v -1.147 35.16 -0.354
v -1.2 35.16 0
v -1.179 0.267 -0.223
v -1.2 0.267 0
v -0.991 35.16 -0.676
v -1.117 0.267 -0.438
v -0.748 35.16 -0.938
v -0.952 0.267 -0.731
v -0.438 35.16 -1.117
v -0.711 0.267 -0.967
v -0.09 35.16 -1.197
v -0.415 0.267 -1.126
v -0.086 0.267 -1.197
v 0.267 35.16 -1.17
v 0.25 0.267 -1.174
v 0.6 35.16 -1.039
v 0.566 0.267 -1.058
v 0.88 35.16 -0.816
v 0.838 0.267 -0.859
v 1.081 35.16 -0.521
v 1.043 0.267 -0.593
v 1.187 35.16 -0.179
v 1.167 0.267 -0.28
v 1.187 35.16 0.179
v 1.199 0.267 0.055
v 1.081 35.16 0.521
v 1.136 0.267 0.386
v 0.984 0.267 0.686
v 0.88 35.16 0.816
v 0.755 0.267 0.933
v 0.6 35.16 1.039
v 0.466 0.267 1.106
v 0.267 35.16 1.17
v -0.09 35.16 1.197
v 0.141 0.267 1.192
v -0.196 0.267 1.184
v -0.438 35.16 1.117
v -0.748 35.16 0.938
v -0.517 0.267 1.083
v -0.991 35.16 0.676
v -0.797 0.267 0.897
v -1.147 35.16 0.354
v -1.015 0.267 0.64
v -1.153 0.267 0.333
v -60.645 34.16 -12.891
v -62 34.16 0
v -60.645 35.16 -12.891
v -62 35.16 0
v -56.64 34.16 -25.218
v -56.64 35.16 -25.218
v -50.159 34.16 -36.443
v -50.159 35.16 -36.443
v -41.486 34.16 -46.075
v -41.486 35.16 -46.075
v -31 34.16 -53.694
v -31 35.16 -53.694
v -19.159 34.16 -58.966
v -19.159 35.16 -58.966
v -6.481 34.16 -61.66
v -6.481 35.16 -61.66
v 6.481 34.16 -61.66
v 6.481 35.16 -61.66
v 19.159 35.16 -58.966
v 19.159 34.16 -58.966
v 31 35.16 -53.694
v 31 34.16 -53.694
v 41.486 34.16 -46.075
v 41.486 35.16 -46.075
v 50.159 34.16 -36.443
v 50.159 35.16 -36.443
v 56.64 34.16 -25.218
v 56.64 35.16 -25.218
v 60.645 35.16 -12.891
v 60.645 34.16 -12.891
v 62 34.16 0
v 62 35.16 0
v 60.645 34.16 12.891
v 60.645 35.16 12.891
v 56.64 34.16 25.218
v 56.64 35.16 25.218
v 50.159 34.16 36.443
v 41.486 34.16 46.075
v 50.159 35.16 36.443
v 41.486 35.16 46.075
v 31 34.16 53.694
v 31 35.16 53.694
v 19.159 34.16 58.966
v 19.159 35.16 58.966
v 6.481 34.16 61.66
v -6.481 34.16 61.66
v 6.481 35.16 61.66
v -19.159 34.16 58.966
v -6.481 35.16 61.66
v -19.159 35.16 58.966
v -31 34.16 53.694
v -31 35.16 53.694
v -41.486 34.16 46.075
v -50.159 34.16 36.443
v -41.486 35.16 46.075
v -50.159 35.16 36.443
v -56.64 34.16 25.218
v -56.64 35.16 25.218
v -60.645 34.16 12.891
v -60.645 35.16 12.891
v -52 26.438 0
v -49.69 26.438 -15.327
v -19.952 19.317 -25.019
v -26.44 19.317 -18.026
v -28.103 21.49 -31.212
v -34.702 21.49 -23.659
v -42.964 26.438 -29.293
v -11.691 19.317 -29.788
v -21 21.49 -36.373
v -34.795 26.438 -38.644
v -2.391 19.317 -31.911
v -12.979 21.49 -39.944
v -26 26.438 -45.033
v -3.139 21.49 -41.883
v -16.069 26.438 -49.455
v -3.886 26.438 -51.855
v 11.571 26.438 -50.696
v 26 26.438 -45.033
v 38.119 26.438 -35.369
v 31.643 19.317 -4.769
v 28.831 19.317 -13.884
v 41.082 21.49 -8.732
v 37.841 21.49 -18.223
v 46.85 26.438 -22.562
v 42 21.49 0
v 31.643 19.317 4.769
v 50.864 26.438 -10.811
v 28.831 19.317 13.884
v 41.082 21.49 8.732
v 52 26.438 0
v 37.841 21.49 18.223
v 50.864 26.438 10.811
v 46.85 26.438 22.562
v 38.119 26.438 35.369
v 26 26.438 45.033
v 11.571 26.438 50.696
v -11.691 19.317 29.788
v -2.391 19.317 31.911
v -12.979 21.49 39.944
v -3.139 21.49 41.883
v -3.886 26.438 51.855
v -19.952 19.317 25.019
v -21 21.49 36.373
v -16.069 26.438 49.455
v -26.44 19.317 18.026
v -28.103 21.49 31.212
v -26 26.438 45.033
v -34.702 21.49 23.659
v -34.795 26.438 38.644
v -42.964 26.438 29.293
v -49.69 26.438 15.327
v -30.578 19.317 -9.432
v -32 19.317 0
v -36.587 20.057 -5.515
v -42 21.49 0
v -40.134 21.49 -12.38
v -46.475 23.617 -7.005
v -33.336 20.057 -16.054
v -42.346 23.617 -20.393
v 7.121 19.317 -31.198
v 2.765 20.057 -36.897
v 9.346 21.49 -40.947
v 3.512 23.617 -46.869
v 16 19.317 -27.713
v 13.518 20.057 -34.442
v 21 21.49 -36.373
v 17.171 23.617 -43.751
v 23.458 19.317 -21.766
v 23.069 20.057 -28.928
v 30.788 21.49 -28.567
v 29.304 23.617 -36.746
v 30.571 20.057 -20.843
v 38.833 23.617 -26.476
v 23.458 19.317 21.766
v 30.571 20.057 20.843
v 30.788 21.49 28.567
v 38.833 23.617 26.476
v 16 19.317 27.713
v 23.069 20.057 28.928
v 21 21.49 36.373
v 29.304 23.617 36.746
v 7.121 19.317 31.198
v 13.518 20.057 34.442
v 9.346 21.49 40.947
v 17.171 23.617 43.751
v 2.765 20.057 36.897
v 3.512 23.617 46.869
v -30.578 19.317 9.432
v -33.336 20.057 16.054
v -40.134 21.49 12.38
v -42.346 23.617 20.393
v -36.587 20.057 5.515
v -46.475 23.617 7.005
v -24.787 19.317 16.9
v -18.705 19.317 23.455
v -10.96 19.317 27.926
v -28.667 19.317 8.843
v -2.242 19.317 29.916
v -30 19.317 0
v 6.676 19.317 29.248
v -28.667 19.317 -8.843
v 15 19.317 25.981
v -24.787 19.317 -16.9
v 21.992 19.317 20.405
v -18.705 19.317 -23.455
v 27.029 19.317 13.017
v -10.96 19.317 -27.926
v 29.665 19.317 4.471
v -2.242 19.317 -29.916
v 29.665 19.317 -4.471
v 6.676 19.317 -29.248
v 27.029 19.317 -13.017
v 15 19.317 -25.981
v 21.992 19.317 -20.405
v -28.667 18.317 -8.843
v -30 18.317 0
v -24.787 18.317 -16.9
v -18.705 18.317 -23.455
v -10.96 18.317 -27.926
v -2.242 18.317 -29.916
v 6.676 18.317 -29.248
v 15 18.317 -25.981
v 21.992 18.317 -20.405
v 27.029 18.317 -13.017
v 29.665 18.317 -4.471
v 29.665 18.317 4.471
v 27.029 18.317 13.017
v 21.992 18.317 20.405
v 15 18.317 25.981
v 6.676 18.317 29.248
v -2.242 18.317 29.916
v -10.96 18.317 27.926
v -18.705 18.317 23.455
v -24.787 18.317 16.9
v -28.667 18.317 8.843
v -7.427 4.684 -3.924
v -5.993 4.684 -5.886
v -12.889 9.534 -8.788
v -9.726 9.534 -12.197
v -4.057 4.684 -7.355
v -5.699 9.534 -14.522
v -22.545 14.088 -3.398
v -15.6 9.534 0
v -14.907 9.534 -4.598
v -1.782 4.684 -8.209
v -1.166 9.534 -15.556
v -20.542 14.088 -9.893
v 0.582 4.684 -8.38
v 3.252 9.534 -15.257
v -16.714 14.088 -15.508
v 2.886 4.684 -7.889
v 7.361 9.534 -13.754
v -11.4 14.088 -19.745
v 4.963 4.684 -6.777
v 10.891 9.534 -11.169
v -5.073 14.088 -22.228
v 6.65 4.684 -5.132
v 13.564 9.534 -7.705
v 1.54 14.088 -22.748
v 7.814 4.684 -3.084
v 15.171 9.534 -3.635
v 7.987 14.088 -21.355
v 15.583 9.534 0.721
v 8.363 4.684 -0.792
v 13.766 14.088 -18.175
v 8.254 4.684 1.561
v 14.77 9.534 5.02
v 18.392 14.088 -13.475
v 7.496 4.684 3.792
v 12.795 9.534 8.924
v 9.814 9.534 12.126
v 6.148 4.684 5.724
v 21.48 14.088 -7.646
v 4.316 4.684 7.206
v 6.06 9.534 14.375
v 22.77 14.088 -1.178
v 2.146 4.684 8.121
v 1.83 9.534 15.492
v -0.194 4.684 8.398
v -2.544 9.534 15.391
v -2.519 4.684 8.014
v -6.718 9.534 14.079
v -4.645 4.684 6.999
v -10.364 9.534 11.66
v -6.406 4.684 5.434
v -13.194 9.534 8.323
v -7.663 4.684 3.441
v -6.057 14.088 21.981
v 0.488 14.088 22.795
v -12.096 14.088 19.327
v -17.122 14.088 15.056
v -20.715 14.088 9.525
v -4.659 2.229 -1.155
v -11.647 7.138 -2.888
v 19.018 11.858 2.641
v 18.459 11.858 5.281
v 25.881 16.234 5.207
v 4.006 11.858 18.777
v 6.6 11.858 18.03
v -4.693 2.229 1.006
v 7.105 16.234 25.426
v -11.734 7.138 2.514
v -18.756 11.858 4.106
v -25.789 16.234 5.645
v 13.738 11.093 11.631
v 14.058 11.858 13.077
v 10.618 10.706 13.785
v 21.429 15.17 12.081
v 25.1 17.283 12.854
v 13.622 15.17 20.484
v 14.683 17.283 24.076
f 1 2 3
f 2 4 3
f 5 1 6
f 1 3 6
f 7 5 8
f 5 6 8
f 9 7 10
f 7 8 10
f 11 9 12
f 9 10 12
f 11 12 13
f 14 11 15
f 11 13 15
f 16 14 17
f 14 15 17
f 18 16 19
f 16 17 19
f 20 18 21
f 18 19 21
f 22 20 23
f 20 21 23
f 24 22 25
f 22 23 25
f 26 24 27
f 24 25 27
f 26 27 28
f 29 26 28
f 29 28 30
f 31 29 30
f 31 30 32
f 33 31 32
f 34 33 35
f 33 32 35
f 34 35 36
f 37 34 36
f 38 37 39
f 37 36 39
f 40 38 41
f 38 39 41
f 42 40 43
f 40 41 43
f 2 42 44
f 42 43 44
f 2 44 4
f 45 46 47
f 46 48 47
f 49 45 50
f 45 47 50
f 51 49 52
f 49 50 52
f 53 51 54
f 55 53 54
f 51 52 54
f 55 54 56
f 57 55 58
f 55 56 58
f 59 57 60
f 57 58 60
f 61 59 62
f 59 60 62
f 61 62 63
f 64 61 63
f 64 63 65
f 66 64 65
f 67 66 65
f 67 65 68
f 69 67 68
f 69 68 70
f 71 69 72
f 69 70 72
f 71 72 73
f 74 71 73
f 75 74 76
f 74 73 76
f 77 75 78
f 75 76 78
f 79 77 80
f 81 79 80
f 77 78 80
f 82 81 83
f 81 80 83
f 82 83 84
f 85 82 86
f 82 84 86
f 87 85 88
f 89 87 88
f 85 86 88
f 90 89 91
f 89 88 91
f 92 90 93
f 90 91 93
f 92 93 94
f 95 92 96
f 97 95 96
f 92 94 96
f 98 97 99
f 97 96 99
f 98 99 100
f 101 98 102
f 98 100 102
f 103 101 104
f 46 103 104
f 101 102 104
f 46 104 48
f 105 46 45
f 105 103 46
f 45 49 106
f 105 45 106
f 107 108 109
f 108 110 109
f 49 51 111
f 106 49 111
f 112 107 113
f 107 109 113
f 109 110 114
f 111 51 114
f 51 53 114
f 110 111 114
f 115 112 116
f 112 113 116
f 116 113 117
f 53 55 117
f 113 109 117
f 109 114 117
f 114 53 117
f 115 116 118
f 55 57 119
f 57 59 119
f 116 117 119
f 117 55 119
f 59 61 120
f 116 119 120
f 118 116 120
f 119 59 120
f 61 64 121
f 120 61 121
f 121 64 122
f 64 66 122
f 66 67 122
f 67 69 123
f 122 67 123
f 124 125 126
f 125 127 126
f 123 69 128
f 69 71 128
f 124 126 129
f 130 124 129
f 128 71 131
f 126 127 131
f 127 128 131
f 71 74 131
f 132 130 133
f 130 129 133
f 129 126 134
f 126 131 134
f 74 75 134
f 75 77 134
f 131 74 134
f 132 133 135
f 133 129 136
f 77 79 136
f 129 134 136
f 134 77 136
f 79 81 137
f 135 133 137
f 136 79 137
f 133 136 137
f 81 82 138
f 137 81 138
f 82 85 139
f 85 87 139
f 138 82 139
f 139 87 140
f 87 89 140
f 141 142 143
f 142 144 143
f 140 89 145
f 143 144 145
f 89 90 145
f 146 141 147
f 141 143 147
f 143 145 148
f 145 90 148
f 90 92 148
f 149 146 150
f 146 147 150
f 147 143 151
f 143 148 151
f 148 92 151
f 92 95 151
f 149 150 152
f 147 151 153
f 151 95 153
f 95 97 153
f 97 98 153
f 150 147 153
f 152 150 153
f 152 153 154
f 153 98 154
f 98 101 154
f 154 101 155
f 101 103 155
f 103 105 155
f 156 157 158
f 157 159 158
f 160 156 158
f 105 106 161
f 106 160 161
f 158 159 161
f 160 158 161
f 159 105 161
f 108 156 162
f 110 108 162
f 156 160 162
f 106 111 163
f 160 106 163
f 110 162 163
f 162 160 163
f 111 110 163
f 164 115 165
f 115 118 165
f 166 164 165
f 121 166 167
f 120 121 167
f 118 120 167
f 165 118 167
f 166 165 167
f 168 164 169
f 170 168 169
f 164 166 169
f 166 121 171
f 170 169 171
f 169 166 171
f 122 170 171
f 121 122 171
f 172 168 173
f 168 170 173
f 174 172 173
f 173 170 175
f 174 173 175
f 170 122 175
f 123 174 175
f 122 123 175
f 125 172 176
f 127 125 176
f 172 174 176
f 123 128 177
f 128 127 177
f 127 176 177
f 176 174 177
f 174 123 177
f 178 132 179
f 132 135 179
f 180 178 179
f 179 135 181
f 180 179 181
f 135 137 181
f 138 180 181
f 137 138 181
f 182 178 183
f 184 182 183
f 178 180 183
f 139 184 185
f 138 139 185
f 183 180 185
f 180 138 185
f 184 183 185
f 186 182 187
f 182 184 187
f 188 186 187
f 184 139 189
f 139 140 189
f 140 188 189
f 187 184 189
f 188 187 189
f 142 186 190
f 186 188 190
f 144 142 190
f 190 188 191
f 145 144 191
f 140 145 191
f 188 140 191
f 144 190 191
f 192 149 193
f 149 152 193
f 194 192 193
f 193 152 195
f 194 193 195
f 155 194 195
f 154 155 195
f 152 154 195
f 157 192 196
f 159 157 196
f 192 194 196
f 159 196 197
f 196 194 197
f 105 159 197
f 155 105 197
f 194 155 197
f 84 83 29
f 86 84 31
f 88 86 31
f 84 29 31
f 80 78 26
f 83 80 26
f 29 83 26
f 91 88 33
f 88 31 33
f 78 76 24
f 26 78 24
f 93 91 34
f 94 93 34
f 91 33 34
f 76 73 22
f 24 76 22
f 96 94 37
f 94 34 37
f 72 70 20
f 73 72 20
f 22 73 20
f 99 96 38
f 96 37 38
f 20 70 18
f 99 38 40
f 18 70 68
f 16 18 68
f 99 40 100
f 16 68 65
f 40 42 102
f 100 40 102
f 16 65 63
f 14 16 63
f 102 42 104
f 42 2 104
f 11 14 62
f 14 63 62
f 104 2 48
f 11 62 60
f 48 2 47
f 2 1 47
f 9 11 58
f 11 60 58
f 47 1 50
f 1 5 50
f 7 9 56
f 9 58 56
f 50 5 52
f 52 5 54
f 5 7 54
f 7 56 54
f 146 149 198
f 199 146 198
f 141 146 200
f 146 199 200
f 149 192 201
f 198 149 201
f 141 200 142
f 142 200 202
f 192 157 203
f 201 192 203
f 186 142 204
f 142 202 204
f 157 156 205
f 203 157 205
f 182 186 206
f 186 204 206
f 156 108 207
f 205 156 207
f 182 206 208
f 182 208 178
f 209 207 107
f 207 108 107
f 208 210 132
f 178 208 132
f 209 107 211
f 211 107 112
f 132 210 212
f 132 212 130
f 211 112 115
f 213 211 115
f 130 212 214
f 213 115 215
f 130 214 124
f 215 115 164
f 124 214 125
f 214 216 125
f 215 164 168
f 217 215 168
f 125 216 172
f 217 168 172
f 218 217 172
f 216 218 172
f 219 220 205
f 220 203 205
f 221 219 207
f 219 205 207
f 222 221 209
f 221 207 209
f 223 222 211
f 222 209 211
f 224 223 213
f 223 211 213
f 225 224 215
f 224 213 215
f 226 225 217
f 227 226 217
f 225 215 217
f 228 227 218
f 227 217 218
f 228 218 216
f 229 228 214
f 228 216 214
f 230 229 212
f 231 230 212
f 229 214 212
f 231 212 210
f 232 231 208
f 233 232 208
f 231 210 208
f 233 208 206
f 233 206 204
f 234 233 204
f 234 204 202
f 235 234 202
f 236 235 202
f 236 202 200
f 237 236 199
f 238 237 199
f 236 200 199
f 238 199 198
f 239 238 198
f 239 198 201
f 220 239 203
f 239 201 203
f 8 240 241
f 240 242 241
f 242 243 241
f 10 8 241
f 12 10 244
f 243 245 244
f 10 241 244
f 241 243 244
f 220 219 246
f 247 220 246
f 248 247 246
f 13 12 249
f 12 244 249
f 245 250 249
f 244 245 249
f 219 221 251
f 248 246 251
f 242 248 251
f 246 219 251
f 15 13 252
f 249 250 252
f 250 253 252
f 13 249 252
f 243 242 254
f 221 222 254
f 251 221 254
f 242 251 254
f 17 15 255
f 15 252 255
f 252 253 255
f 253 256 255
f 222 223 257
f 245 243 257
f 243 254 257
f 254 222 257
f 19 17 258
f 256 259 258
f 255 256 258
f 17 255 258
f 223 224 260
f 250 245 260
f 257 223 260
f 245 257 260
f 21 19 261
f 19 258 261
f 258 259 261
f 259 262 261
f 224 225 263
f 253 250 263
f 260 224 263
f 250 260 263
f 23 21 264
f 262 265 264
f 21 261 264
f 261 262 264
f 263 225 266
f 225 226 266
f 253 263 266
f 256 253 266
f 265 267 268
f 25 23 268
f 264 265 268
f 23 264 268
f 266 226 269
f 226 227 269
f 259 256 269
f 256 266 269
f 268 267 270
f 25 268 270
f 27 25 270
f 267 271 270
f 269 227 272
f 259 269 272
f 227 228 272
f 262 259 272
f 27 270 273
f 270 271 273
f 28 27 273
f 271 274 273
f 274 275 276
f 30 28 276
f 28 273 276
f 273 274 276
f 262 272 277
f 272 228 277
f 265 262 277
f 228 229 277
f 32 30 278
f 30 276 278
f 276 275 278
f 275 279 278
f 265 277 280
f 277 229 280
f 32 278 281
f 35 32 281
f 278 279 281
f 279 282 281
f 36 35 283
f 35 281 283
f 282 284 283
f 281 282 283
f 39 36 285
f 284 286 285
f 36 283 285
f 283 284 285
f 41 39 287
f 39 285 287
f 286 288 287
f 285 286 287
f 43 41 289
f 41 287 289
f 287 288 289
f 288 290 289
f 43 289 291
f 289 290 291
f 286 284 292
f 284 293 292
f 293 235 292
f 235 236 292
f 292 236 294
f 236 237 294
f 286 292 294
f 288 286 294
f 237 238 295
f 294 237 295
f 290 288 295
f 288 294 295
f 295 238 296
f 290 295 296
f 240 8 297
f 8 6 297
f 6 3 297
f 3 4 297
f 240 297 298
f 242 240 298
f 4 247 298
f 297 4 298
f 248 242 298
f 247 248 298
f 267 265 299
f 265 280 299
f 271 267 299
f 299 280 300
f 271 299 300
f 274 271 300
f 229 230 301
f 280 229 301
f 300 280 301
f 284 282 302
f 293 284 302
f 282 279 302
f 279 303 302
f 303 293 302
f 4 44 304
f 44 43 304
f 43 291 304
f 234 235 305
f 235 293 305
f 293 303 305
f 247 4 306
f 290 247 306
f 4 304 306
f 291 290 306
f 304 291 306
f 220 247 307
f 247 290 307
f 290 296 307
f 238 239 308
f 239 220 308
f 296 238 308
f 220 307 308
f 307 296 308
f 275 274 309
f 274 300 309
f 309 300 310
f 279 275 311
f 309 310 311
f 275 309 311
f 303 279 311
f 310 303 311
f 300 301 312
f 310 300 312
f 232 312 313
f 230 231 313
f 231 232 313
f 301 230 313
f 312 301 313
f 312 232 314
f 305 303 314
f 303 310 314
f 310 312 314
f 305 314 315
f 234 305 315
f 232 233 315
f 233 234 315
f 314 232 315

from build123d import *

# Parameters (mm, degrees)
SKETCH5_R          = 1.2
CUT_EXTRUDE1_DEPTH = 95.467954306


with BuildPart() as part:
    # Sketch3 → Revolve4 (revolve)
    with BuildSketch(Plane.XY, mode=Mode.PRIVATE) as revolve4_sk:
        with BuildLine():
            Line((1.2, 35.159555727), (1.2, 30.159555727))
            Line((1.2, 30.159555727), (0, 30.159555727))
            Line((0, 30.159555727), (0, 0))
            add(Edge.make_bspline(
                [(0, 0), (3.750000005, 0.294761526), (7.499999999, 5.048271343), (11.250000002, 6.10210111), (14.999999999, 9.433669628), (18.749999999, 11.703227443), (22.499999999, 13.953126222), (26.249999999, 16.181221128), (30, 18.316968407)],
                knots=[0.079130383, 0.079130383, 0.079130383, 0.079130383, 0.079130383, 0.079130383, 0.079130383, 0.079130383, 0.079130383, 0.916284581, 0.916284581, 0.916284581, 0.916284581, 0.916284581, 0.916284581, 0.916284581, 0.916284581, 0.916284581], degree=8))
            Line((30, 18.316968407), (30, 19.316968407))
            Line((30, 19.316968407), (32, 19.316968407))
            add(Edge.make_bspline(
                [(32, 19.316968407), (47, 20.496014481), (62, 34.159555727)],
                knots=[0.08454747, 0.08454747, 0.08454747, 0.930022175, 0.930022175, 0.930022175], degree=2))
            Line((62, 34.159555727), (62, 35.159555727))
            Line((62, 35.159555727), (1.2, 35.159555727))
        make_face()
    revolve(revolve4_sk.sketch.rotate(Axis((0, 35.159555727, 0), (0, -1, 0)), 180), axis=Axis((0, 35.159555727, 0), (0, -1, 0)))

    # Sketch5 → Cut-Extrude1 (cut, through all)
    with BuildSketch(Plane(origin=(0, 35.159555727, 0), x_dir=(1, 0, 0), z_dir=(0, 1, 0))):
        with Locations(Location((0, 0, 0), (0, 0, 180))):
            Circle(SKETCH5_R)
    extrude(amount=-CUT_EXTRUDE1_DEPTH, mode=Mode.SUBTRACT)


solid = part.part
